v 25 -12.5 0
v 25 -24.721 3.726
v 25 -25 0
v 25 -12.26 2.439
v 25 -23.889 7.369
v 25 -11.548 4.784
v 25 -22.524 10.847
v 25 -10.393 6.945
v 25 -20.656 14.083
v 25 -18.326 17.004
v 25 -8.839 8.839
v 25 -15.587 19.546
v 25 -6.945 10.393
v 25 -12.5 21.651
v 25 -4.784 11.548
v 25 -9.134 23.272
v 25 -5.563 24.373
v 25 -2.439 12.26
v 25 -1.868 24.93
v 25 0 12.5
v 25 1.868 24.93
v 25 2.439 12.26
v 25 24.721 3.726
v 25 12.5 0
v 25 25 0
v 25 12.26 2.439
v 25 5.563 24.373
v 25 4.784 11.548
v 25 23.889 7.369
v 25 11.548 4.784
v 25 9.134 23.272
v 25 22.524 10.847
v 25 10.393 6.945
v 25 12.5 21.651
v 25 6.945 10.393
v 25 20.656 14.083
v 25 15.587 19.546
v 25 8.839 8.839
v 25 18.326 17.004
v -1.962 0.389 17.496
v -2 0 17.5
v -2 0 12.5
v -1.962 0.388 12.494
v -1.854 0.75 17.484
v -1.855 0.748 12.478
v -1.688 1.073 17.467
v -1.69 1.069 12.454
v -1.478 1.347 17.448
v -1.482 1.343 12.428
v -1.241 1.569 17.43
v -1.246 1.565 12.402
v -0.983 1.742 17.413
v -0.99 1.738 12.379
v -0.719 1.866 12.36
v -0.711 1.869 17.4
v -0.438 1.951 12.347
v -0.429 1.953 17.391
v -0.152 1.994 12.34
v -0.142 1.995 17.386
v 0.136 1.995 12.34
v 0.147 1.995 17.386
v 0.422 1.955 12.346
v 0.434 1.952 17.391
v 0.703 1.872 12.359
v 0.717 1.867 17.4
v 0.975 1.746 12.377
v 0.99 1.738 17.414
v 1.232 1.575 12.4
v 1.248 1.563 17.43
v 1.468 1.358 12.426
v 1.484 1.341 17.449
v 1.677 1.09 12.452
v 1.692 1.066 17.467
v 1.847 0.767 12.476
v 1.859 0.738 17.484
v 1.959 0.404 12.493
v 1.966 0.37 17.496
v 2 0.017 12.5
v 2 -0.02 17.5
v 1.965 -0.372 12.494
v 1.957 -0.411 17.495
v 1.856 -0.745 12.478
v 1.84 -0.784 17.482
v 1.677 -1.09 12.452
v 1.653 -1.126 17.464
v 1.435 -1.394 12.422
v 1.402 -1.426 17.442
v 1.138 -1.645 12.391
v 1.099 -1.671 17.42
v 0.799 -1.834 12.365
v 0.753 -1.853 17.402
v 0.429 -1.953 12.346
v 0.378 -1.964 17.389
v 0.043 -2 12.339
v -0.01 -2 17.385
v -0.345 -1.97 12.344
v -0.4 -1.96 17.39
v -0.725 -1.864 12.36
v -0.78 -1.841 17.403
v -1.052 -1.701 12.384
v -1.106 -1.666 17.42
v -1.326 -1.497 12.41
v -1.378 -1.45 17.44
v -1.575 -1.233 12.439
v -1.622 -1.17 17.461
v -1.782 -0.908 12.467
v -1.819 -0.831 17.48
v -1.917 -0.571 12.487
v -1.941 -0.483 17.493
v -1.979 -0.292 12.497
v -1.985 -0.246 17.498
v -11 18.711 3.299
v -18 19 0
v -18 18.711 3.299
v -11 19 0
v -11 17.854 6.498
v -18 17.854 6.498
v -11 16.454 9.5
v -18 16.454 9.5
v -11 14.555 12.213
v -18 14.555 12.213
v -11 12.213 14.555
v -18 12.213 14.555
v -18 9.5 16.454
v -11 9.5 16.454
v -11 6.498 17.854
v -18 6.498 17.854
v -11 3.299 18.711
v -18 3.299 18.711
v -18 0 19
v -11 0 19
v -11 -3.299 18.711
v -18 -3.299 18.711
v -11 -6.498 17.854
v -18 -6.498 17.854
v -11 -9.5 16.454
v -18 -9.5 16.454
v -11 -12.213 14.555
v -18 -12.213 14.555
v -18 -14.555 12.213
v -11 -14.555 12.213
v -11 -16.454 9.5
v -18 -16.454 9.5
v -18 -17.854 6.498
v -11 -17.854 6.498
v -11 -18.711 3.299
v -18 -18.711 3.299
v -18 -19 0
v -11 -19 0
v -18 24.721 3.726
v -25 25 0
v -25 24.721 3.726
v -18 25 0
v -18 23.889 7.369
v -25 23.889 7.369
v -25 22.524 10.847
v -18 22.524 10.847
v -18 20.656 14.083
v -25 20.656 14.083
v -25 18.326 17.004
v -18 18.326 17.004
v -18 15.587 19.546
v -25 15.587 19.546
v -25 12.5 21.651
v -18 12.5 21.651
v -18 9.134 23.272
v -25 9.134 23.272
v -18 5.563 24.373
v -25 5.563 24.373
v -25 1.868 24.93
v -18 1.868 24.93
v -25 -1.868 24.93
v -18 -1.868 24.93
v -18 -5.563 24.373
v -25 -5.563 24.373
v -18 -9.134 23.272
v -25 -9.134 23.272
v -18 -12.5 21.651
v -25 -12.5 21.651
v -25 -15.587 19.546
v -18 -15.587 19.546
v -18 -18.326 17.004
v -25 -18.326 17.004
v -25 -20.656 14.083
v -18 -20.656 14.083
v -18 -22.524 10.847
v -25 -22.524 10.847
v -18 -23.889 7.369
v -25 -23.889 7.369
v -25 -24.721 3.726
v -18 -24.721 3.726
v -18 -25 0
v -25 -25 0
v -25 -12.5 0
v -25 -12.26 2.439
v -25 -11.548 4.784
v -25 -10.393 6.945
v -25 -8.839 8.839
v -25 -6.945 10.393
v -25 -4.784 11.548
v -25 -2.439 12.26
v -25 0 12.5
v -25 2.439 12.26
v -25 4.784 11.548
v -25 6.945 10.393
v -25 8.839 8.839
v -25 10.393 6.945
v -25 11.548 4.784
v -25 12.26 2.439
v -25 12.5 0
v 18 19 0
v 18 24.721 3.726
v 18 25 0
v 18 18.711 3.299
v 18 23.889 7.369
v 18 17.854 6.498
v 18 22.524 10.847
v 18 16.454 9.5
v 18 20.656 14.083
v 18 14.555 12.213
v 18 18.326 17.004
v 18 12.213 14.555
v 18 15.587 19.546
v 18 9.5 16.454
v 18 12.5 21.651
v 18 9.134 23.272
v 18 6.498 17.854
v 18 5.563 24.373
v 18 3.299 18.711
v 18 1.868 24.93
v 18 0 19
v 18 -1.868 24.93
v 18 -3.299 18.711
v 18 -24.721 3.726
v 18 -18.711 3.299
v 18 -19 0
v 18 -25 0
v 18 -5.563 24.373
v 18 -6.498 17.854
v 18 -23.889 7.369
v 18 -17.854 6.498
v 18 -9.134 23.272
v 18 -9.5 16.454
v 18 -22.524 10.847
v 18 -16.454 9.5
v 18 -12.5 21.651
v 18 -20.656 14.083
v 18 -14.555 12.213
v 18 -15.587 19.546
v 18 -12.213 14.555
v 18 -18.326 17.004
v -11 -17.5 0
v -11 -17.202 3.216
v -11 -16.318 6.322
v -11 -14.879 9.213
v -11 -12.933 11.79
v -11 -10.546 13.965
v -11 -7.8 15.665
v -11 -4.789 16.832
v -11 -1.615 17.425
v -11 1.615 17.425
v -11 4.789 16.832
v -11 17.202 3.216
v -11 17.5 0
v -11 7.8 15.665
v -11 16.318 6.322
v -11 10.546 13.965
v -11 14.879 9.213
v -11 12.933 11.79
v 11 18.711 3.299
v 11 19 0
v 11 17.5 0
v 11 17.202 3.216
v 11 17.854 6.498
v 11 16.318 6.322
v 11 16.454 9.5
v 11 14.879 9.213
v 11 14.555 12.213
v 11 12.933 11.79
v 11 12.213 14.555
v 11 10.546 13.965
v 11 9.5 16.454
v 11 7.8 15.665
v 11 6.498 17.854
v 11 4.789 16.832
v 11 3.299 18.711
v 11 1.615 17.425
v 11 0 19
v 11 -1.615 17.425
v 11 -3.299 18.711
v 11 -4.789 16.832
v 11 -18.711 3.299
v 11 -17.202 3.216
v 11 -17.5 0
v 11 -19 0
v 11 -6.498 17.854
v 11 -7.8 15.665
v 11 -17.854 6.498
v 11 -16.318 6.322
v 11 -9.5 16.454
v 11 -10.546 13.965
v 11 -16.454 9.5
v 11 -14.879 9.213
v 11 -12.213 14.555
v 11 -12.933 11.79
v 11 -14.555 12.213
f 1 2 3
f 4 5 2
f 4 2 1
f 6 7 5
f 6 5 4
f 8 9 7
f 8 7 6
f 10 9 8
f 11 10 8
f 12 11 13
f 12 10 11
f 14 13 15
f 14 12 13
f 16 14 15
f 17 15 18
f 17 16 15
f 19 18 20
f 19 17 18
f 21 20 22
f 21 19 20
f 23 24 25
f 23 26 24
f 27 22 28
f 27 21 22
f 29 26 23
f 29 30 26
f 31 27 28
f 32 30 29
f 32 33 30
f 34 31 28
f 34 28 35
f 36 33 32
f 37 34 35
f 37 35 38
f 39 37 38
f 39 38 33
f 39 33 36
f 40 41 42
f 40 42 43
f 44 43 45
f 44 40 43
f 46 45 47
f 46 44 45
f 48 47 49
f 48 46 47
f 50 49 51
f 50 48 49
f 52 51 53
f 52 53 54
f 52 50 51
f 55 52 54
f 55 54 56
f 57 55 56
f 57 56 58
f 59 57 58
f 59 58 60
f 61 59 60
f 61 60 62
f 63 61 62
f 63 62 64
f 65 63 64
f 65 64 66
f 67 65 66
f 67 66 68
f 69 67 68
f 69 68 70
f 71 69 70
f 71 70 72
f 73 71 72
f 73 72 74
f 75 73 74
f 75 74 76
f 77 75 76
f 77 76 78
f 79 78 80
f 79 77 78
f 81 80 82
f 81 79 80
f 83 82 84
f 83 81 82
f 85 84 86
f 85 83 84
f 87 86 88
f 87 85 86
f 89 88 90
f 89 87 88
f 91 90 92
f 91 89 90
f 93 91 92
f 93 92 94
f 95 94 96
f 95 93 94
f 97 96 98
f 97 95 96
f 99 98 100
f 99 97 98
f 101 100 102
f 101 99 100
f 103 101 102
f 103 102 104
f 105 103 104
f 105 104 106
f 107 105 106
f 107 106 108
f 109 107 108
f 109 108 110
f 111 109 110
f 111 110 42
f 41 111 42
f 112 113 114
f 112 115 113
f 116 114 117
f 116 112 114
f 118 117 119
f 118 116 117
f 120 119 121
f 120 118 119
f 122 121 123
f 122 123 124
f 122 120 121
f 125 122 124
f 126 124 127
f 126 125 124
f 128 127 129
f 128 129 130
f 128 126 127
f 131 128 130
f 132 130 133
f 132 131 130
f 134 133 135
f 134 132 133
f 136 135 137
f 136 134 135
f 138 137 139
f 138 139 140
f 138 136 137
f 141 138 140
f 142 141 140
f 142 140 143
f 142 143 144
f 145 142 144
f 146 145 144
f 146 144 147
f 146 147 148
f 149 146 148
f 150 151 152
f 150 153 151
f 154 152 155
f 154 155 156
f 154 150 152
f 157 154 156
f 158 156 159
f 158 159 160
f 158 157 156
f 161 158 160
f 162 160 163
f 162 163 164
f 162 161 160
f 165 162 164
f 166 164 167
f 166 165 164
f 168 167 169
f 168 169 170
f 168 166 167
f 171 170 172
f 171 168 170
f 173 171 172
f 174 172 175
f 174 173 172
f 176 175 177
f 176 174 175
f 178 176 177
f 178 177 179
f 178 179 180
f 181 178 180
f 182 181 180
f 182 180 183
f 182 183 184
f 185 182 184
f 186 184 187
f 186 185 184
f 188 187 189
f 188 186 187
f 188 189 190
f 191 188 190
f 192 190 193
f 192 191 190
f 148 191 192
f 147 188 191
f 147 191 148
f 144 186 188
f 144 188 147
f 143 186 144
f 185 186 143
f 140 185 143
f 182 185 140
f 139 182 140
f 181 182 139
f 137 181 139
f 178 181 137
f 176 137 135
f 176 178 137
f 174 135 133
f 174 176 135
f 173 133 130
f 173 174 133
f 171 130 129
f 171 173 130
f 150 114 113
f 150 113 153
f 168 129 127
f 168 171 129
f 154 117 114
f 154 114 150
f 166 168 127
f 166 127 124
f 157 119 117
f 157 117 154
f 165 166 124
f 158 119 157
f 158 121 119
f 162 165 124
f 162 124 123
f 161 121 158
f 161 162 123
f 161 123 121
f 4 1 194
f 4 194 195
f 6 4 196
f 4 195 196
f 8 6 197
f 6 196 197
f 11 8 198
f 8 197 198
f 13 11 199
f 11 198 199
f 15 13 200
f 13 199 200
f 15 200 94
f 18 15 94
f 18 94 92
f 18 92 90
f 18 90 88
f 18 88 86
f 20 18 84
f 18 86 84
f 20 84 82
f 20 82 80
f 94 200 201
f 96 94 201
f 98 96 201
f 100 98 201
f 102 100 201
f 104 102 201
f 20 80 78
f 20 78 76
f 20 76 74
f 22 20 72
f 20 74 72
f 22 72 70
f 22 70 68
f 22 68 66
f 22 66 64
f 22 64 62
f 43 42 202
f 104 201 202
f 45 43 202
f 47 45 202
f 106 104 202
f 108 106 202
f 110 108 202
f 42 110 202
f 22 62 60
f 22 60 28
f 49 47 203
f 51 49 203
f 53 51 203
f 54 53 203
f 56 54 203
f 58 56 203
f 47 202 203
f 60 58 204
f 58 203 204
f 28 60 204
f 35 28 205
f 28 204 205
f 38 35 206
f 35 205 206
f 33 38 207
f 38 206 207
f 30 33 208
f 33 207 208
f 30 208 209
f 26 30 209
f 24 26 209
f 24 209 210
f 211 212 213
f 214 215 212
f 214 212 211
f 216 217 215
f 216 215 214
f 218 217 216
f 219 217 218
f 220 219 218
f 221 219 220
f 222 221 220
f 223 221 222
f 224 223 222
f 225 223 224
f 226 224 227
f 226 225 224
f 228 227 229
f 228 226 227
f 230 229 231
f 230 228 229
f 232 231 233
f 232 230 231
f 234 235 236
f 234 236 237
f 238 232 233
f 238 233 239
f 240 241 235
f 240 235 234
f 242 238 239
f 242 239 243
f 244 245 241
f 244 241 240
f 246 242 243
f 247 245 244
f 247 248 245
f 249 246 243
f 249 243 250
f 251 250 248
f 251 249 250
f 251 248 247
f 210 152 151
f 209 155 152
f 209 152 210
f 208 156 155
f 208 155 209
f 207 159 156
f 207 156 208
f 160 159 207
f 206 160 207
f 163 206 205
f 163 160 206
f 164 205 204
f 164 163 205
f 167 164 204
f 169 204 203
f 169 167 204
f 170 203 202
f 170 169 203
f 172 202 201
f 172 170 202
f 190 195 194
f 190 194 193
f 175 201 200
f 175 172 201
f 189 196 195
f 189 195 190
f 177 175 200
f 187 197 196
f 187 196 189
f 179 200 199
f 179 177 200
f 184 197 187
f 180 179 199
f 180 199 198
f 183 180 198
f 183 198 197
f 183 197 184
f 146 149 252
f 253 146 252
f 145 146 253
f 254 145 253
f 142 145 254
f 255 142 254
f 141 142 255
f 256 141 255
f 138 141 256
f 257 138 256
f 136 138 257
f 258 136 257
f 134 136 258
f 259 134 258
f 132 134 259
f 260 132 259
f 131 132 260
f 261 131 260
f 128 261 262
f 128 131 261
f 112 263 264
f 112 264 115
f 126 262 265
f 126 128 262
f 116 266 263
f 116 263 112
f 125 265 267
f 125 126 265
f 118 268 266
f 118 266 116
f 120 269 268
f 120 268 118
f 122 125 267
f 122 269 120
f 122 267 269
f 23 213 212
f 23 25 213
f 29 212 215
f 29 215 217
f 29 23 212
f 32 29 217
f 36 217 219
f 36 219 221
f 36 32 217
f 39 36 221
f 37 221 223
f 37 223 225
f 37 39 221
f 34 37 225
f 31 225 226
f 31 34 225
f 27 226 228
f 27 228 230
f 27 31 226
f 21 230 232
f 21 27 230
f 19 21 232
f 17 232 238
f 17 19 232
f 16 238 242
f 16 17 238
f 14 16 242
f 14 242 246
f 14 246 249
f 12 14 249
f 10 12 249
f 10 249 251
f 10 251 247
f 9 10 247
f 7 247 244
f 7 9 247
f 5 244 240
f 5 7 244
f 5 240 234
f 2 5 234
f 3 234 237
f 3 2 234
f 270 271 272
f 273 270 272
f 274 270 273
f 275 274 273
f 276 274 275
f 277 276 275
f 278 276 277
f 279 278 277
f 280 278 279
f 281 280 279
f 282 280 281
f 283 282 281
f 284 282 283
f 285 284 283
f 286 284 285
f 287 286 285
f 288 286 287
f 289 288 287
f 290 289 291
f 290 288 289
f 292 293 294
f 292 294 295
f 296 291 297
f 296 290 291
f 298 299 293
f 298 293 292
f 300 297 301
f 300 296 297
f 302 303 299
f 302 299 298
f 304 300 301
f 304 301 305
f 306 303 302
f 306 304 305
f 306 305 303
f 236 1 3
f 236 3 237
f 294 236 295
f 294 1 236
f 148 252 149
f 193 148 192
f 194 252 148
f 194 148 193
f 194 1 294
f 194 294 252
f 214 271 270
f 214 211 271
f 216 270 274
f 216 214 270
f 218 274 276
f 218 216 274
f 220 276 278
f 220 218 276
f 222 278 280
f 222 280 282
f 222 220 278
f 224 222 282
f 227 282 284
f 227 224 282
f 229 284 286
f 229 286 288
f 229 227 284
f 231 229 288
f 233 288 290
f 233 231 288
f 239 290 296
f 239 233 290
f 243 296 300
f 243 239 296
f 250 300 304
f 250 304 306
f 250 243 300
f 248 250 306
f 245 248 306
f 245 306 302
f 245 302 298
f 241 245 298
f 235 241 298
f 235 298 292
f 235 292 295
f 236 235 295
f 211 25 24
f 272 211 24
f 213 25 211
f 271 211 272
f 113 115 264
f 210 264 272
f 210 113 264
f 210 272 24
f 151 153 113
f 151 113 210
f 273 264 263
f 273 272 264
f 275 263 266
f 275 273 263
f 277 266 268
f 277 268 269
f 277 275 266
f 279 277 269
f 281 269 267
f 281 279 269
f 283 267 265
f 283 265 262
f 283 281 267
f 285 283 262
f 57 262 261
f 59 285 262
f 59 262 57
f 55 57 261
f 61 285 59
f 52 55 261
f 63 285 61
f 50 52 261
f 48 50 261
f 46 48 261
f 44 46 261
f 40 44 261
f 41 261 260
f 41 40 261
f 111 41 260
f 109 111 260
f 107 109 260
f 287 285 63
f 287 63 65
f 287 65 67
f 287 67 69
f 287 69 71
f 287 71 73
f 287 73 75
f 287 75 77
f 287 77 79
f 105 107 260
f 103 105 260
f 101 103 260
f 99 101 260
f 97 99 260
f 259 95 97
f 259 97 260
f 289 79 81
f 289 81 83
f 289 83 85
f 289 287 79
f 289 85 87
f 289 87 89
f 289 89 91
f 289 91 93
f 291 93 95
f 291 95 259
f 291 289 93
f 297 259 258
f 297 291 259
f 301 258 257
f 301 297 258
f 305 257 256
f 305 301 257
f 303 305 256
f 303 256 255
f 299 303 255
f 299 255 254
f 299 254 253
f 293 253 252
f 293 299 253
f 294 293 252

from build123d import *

# Parameters (mm, degrees)
REVOLVE1_ANGLE     = 180
CUT_EXTRUDE3_DEPTH = 50
SKETCH4_R          = 2
CUT_EXTRUDE4_DEPTH = 43


with BuildPart() as part:
    # Sketch1 → Revolve1 (revolve)
    with BuildSketch(Plane.XY):
        Polygon((25, 0), (-25, 0), (-25, 25), (-18, 25), (-18, 19), (-11, 19), (-11, 17.5), (11, 17.5), (11, 19), (18, 19), (18, 25), (25, 25), align=None)
    revolve(axis=Axis((-38.949360705, 0, 0), (1, 0, 0)), revolution_arc=REVOLVE1_ANGLE)

    # Sketch2 → Cut-Extrude3 (cut)
    with BuildSketch(Plane.ZY.offset(25)):
        with BuildLine():
            Line((0, 12.5), (0, -12.5))
            ThreePointArc((0, -12.5), (12.5, 0), (0, 12.5))
        make_face()
    extrude(amount=-CUT_EXTRUDE3_DEPTH, mode=Mode.SUBTRACT)

    # Sketch4 → Cut-Extrude4 (cut)
    with BuildSketch(Plane(origin=(0, 0, 17.5), x_dir=(-1, 0, 0), z_dir=(0, 0, -1))):
        Circle(SKETCH4_R)
    extrude(amount=CUT_EXTRUDE4_DEPTH, mode=Mode.SUBTRACT)


solid = part.part
